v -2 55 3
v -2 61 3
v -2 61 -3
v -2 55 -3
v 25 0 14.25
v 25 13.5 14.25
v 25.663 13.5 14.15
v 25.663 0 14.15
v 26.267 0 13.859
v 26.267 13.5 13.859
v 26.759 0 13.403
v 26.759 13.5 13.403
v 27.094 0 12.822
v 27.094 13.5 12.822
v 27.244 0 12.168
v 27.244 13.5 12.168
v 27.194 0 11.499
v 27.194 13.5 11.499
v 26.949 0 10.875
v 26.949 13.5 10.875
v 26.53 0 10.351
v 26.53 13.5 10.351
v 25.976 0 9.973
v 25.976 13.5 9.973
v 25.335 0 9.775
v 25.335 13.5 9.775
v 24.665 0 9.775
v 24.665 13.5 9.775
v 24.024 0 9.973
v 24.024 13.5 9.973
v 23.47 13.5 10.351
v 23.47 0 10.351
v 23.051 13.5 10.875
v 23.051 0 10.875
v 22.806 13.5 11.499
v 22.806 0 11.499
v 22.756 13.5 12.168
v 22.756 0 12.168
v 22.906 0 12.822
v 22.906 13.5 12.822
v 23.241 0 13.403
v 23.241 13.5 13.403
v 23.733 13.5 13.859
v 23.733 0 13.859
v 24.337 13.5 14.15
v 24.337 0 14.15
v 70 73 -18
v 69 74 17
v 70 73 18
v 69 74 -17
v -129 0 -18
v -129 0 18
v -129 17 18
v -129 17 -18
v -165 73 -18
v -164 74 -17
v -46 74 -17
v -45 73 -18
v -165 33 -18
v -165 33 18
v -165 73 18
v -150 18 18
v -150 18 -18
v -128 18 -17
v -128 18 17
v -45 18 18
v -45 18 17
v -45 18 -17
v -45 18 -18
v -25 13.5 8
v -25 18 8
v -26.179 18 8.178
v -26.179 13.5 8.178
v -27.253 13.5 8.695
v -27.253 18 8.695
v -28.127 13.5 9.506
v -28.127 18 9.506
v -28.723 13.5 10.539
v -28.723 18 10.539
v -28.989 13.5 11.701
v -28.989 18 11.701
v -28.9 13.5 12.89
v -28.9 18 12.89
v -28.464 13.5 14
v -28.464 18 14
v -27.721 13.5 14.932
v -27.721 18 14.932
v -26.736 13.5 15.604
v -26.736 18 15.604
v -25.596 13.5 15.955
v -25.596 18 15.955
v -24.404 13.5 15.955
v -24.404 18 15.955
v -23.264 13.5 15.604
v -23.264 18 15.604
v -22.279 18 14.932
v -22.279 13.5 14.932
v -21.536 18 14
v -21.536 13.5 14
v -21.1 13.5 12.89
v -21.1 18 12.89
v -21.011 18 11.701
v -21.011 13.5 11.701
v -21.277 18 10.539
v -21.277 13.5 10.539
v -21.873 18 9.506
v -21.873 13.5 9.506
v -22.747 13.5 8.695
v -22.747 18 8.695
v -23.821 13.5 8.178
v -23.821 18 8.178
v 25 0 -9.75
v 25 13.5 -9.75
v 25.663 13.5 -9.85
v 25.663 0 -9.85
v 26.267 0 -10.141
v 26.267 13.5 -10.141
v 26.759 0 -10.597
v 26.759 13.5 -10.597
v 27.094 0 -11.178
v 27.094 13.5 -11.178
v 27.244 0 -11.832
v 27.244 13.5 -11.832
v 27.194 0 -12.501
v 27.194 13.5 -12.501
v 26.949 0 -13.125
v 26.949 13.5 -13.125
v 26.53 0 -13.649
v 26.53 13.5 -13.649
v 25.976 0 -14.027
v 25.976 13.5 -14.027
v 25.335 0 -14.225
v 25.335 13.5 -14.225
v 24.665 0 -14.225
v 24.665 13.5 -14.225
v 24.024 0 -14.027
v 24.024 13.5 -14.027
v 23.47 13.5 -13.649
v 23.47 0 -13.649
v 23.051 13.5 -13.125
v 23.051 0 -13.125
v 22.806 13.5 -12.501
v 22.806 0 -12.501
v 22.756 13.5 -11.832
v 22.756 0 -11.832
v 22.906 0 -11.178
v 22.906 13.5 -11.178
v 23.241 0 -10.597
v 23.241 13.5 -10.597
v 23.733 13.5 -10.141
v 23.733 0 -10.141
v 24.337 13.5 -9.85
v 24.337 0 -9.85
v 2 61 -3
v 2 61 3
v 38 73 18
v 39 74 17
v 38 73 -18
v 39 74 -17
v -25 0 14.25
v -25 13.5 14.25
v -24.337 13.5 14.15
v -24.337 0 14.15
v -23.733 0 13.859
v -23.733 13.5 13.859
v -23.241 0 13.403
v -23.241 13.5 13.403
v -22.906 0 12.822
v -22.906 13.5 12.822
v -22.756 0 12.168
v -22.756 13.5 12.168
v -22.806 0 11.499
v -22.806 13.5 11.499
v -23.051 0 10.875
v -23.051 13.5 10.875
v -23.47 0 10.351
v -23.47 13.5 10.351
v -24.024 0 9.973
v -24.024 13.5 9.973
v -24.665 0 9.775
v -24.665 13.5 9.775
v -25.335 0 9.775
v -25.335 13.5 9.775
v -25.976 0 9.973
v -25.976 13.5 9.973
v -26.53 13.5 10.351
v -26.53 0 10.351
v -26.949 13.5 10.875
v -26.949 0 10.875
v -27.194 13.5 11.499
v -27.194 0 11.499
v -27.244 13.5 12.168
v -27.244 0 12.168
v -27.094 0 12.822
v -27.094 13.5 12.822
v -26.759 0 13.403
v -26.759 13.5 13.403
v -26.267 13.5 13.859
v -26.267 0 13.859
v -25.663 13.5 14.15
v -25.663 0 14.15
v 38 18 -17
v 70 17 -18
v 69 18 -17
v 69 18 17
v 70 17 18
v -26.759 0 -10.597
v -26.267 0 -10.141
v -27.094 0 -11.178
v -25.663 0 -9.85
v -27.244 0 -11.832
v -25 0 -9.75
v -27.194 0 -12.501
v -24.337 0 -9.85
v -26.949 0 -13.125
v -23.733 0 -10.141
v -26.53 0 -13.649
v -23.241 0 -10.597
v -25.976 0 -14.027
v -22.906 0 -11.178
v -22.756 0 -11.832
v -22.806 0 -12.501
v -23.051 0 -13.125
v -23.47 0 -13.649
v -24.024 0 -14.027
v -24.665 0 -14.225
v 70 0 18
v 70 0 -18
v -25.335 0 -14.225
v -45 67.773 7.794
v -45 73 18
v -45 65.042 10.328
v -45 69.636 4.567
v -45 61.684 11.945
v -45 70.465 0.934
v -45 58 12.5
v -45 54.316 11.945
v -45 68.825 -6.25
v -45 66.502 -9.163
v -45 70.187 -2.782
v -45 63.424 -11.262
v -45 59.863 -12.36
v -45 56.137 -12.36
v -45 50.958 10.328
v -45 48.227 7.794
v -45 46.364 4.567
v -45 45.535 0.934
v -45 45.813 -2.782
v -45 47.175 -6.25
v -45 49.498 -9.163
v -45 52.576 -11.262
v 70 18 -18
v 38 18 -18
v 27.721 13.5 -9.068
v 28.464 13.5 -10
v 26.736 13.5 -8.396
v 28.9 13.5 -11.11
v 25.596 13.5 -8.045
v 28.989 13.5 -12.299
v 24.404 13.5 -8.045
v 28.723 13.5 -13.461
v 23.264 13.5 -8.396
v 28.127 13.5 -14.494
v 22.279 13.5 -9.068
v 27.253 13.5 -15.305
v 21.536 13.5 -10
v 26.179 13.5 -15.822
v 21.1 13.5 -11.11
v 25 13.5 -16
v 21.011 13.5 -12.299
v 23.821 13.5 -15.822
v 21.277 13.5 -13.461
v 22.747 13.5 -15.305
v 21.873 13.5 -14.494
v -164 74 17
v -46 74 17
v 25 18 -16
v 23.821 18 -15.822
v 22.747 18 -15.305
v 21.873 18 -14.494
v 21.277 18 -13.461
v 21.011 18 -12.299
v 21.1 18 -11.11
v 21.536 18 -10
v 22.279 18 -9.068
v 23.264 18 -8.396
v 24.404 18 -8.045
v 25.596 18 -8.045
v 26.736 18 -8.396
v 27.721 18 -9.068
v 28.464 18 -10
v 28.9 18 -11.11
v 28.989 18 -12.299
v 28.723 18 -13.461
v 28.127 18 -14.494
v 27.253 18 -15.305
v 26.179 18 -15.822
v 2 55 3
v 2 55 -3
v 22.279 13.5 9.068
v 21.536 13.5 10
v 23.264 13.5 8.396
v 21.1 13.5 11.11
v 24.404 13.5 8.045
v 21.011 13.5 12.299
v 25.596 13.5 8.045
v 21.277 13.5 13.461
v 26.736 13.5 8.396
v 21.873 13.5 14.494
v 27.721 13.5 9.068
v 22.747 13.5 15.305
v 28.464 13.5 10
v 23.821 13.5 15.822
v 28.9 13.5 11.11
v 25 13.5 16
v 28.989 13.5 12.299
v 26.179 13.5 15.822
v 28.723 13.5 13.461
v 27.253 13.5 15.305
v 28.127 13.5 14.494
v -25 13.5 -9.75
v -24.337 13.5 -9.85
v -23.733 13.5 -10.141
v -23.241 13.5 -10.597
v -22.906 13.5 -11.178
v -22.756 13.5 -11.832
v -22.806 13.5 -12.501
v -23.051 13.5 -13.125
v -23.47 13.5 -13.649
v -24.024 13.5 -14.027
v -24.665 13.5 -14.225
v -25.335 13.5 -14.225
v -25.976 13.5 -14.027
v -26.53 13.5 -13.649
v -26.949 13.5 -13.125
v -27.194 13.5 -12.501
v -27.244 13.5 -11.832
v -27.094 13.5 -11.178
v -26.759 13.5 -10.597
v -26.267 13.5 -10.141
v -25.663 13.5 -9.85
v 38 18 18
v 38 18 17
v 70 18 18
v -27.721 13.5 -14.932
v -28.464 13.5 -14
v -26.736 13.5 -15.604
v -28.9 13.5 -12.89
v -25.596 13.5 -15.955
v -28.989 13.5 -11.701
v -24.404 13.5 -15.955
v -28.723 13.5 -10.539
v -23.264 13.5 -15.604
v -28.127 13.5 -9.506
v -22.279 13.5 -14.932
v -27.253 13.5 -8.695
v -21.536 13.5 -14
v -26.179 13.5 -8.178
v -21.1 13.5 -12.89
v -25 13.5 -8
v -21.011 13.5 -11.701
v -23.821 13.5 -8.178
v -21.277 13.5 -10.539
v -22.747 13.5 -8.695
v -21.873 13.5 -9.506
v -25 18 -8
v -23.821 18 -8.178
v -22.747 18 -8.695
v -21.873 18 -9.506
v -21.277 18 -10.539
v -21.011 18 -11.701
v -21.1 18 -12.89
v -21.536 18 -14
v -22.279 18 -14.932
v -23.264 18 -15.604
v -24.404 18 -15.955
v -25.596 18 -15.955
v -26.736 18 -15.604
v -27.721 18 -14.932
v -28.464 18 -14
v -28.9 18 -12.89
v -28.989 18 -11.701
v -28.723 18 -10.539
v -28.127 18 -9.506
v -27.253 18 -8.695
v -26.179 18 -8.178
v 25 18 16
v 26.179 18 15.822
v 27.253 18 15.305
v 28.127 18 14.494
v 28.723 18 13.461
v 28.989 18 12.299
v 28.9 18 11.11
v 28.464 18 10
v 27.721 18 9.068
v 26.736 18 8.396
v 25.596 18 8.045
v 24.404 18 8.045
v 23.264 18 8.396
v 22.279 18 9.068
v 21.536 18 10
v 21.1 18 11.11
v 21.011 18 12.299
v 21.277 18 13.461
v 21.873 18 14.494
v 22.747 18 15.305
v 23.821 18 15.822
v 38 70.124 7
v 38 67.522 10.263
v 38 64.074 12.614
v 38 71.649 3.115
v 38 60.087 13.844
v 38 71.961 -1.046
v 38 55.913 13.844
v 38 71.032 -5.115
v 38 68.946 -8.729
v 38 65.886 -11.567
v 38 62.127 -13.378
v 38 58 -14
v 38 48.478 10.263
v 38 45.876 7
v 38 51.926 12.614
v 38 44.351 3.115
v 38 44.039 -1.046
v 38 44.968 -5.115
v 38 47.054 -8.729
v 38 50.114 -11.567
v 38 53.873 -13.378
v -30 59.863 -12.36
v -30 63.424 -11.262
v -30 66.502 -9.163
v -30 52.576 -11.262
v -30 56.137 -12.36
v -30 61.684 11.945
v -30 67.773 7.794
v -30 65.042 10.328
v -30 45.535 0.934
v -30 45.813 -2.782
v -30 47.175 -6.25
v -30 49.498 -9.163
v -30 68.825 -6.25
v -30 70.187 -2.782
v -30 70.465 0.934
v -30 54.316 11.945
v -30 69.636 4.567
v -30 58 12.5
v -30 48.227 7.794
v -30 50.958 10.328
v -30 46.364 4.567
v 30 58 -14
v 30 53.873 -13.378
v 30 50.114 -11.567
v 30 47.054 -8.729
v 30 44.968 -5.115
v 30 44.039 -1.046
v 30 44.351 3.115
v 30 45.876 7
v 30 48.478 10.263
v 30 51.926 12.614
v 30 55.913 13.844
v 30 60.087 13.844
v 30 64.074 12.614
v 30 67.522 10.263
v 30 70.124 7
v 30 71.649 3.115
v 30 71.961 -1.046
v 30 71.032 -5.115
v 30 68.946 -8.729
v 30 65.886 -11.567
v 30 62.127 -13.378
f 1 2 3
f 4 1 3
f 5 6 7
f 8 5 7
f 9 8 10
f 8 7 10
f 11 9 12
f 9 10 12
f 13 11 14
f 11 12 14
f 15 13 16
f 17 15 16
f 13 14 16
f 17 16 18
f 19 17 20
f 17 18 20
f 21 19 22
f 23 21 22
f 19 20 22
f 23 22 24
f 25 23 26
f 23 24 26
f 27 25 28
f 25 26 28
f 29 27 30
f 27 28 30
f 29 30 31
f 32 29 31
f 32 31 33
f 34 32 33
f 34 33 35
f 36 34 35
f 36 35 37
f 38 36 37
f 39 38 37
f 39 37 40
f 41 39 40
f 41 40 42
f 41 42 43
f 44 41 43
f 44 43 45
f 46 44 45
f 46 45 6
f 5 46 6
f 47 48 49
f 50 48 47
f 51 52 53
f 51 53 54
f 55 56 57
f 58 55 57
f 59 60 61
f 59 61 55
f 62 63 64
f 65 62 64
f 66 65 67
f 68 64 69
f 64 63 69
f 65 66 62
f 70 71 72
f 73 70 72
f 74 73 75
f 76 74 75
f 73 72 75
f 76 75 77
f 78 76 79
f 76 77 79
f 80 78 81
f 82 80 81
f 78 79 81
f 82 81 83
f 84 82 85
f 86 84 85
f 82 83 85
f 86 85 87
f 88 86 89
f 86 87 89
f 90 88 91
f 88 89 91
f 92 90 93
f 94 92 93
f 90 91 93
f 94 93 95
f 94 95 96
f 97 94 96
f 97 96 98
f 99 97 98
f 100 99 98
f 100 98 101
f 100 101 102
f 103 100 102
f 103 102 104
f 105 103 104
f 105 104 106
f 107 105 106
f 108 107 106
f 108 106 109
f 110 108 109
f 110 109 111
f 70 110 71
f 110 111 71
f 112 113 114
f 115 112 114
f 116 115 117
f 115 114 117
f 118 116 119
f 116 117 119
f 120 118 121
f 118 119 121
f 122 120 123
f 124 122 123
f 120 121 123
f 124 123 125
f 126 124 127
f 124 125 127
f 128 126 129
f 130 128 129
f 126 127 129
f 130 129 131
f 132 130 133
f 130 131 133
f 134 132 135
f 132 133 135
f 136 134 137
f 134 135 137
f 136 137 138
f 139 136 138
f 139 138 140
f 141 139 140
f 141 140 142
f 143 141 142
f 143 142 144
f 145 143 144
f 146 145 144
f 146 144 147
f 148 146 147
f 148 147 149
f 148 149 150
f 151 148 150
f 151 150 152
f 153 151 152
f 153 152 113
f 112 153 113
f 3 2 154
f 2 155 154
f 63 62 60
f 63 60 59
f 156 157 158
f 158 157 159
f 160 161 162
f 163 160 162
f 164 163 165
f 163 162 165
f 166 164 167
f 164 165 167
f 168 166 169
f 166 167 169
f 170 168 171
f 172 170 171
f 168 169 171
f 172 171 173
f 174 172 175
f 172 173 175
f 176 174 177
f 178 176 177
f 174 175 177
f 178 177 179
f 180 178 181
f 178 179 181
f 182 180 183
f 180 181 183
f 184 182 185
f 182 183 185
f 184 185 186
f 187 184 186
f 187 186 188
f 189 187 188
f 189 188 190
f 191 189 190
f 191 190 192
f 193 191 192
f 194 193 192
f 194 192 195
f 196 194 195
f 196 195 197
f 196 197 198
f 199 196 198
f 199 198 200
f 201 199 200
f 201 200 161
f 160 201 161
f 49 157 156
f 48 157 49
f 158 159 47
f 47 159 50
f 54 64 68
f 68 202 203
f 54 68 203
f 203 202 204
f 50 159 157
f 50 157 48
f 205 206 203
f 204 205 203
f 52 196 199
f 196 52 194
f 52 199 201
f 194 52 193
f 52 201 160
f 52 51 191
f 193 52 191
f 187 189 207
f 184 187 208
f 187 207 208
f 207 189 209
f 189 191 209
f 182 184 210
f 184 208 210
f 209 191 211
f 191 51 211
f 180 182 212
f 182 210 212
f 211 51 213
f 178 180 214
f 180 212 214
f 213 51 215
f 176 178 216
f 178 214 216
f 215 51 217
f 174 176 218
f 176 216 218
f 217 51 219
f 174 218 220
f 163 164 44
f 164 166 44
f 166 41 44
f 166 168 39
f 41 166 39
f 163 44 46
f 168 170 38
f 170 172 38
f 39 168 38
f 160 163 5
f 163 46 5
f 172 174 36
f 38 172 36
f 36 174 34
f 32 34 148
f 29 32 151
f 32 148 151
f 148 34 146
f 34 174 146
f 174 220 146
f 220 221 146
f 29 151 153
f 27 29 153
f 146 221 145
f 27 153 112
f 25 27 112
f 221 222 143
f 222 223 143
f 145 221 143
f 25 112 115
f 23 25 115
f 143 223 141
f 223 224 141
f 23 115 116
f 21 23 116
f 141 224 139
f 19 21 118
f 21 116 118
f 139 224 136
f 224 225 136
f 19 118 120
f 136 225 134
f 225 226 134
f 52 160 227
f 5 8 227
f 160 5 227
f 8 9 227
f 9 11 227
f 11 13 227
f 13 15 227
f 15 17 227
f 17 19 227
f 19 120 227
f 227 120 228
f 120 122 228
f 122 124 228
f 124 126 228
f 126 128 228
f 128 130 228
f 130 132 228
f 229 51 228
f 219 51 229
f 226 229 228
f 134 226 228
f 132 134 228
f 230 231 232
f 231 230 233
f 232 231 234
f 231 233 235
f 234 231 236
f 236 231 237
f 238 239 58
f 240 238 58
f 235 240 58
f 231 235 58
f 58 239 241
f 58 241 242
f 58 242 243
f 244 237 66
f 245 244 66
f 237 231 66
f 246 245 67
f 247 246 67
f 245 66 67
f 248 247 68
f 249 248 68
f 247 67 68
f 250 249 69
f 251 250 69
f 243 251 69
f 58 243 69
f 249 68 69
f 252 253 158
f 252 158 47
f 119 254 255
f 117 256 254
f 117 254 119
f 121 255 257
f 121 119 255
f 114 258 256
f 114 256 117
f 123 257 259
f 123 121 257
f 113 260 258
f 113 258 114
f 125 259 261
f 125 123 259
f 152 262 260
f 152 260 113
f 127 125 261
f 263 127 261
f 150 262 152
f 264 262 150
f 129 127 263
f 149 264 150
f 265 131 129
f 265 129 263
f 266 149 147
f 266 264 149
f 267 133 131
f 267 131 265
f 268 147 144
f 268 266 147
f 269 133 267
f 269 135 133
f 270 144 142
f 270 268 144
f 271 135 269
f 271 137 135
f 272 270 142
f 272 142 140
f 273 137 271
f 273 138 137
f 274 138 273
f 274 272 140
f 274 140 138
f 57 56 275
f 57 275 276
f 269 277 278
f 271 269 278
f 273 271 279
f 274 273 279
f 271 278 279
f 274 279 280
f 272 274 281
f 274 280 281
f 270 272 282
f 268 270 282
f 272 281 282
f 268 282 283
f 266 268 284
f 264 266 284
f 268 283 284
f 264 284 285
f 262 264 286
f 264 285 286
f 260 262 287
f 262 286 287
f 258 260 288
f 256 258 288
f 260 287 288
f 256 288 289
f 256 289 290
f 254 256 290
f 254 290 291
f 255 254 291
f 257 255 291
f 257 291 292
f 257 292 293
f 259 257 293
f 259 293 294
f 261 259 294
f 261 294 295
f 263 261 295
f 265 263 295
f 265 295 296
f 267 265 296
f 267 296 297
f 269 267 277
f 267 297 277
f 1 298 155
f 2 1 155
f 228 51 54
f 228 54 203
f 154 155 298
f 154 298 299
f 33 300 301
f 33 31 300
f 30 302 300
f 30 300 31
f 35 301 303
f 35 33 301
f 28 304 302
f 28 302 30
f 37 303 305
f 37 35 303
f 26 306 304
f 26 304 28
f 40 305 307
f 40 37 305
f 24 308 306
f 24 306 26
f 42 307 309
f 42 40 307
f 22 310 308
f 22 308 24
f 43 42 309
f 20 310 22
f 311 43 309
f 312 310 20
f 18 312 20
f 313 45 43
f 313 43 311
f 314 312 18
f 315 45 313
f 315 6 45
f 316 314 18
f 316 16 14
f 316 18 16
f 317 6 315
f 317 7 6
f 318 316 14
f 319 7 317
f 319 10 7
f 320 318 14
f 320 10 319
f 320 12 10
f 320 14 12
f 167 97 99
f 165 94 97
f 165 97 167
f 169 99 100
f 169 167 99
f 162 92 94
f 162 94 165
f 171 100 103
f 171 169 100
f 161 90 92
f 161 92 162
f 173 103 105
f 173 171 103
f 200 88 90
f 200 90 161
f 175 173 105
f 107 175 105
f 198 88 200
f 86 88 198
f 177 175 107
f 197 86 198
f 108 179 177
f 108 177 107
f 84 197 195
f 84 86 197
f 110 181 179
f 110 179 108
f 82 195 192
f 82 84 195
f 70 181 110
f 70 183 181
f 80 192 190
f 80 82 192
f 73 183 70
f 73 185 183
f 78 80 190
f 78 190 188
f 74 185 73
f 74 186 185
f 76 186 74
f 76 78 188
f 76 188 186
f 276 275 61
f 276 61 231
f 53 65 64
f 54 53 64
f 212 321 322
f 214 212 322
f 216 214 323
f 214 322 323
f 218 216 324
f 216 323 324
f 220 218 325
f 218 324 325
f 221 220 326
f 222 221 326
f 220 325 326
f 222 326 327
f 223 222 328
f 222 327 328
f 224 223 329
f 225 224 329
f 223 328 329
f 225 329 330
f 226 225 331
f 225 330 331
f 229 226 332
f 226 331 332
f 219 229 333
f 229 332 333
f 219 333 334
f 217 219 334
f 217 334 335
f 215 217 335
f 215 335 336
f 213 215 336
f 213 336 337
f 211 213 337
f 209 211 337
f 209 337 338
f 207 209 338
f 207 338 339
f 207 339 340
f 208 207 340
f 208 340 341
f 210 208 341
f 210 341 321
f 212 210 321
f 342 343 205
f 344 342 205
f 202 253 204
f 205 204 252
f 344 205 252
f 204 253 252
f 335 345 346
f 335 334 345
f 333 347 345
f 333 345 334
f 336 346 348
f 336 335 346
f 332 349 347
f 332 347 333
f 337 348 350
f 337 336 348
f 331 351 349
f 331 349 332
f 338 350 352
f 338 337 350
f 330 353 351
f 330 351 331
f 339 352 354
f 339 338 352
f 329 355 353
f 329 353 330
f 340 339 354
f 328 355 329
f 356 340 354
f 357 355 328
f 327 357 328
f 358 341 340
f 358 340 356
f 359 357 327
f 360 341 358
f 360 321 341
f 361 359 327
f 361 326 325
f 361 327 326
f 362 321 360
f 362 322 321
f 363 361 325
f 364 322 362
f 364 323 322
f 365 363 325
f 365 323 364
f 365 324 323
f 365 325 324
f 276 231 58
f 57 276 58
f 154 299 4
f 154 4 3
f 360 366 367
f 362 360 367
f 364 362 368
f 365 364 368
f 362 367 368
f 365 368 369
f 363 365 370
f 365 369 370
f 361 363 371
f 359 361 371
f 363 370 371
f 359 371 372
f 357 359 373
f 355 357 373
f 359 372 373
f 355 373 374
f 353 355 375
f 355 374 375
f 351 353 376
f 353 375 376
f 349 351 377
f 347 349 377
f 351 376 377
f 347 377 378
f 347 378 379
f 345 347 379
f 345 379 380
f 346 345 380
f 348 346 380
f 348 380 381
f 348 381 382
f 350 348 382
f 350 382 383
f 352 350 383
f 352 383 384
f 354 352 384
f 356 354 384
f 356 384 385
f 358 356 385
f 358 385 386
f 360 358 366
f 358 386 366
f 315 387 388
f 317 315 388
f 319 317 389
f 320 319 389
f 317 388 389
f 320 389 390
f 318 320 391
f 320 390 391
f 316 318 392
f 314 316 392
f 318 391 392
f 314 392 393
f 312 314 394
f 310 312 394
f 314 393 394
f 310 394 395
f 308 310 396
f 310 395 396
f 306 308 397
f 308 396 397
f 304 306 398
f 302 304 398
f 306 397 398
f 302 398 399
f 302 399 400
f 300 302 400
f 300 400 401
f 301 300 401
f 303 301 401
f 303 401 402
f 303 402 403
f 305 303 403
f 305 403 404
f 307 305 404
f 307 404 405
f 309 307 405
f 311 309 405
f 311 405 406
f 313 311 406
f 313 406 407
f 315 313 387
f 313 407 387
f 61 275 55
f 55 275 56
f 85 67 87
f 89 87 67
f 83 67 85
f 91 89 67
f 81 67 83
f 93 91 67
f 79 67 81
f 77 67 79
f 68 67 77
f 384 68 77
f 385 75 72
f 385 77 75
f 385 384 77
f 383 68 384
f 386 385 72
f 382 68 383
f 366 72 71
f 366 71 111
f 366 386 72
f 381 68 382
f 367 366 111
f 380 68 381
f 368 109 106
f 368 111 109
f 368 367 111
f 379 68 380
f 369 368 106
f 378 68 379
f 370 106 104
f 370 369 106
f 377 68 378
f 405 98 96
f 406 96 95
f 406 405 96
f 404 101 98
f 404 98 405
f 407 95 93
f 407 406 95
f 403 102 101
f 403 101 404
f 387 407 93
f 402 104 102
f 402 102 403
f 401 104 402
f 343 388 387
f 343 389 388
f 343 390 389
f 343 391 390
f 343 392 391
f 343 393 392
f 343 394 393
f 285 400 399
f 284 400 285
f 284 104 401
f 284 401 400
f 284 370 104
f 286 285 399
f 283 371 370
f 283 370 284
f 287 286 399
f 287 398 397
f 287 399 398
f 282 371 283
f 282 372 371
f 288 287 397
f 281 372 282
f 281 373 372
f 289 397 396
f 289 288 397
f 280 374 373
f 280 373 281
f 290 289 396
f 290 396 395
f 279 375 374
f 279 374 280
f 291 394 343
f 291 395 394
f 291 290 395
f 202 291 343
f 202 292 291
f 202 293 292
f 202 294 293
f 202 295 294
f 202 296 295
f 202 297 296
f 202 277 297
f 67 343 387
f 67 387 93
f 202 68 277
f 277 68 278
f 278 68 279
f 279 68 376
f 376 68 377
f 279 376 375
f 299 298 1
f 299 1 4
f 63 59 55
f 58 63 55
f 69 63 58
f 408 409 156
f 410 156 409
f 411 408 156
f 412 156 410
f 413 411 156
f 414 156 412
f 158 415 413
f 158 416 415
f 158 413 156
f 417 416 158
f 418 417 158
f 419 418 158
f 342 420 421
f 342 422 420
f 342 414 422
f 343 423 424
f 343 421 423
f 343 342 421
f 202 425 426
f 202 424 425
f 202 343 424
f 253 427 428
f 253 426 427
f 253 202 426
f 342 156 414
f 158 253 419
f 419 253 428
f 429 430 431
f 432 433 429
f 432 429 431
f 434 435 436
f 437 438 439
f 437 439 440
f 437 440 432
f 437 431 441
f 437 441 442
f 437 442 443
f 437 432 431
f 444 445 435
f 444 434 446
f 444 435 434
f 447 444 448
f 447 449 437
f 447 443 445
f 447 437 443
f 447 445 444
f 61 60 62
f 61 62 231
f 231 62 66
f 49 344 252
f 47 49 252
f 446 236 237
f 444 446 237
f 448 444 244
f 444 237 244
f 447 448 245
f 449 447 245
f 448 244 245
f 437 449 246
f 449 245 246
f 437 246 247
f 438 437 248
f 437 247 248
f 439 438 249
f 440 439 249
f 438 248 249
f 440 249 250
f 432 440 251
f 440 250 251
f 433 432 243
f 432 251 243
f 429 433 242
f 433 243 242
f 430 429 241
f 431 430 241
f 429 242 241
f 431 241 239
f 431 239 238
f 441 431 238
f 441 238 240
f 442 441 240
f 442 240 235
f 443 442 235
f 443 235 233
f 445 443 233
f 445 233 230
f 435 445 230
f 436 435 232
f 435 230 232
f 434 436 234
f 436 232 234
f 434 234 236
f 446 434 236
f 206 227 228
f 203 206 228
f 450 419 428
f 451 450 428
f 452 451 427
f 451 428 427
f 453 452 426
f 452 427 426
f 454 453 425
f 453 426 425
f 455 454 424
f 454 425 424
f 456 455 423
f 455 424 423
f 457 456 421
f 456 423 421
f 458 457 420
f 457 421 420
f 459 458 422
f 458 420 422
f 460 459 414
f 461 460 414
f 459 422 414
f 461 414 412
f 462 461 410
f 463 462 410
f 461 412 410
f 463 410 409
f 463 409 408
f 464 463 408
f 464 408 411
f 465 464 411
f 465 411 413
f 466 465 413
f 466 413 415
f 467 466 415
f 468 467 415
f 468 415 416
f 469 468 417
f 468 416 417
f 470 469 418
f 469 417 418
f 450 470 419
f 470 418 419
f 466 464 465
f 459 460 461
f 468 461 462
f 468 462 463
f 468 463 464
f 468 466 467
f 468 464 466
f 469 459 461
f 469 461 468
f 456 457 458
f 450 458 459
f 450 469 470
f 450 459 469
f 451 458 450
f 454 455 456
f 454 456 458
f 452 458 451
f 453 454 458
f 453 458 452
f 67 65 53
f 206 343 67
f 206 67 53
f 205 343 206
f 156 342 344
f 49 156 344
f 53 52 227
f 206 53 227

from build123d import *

# Parameters (mm, degrees)
SKETCH1_W           = 199
SKETCH1_H           = 36
BOSS_EXTRUDE1_DEPTH = 18
SKETCH2_R           = 4
CUT_EXTRUDE1_DEPTH  = 4.5
CUT_EXTRUDE2_REACH  = 132.948
SKETCH3_R           = 2.25
CHAMFER1_SIZE       = 1
SKETCH4_W           = 120
SKETCH4_H           = 36
SKETCH4_W_2         = 32
BOSS_EXTRUDE2_DEPTH = 56
CHAMFER2_SIZE       = 1
CHAMFER3_SIZE       = 15
SKETCH5_R           = 12.5
BOSS_EXTRUDE3_DEPTH = 15
SKETCH6_R           = 14
BOSS_EXTRUDE4_DEPTH = 8
SKETCH7_W           = 6
SKETCH7_H           = 6
BOSS_EXTRUDE5_DEPTH = 2


with BuildPart() as part:
    # Sketch1 → Boss-Extrude1 (new body)
    with BuildSketch(Plane(origin=(0, 0, 0), x_dir=(1, 0, 0), z_dir=(0, 1, 0))):
        with Locations((-29.5, 0)):
            Rectangle(SKETCH1_W, SKETCH1_H)
    extrude(amount=BOSS_EXTRUDE1_DEPTH)

    # Sketch2 → Cut-Extrude1 (cut)
    with BuildSketch(Plane(origin=(0, 18, 0), x_dir=(1, 0, 0), z_dir=(0, 1, 0))):
        with Locations(Location((-25, 12, 0), (0, 0, 270))):
            Circle(SKETCH2_R)
        with Locations(Location((25, 12, 0), (0, 0, 90))):
            Circle(SKETCH2_R)
        with Locations(Location((25, -12, 0), (0, 0, 270))):
            Circle(SKETCH2_R)
        with Locations(Location((-25, -12, 0), (0, 0, 90))):
            Circle(SKETCH2_R)
    extrude(amount=-CUT_EXTRUDE1_DEPTH, mode=Mode.SUBTRACT)

    # Sketch3 → Cut-Extrude2 (cut, up to next)
    with BuildSketch(Plane(origin=(0, 13.5, 0), x_dir=(1, 0, 0), z_dir=(0, 1, 0)), mode=Mode.PRIVATE) as cut_extrude2_sk1:
        with Locations(Location((-25, 12, 0), (0, 0, 270))):
            Circle(SKETCH3_R)
    cut_extrude2_tool1 = extrude(cut_extrude2_sk1.sketch, amount=-CUT_EXTRUDE2_REACH, mode=Mode.PRIVATE) & part.part
    # Sketch3 → Cut-Extrude2 (cut, up to next)
    with BuildSketch(Plane(origin=(0, 13.5, 0), x_dir=(1, 0, 0), z_dir=(0, 1, 0)), mode=Mode.PRIVATE) as cut_extrude2_sk2:
        with Locations(Location((-25, -12, 0), (0, 0, 270))):
            Circle(SKETCH3_R)
    cut_extrude2_tool2 = extrude(cut_extrude2_sk2.sketch, amount=-CUT_EXTRUDE2_REACH, mode=Mode.PRIVATE) & part.part
    # Sketch3 → Cut-Extrude2 (cut, up to next)
    with BuildSketch(Plane(origin=(0, 13.5, 0), x_dir=(1, 0, 0), z_dir=(0, 1, 0)), mode=Mode.PRIVATE) as cut_extrude2_sk3:
        with Locations(Location((25, 12, 0), (0, 0, 270))):
            Circle(SKETCH3_R)
    cut_extrude2_tool3 = extrude(cut_extrude2_sk3.sketch, amount=-CUT_EXTRUDE2_REACH, mode=Mode.PRIVATE) & part.part
    # Sketch3 → Cut-Extrude2 (cut, up to next)
    with BuildSketch(Plane(origin=(0, 13.5, 0), x_dir=(1, 0, 0), z_dir=(0, 1, 0)), mode=Mode.PRIVATE) as cut_extrude2_sk4:
        with Locations(Location((25, -12, 0), (0, 0, 270))):
            Circle(SKETCH3_R)
    cut_extrude2_tool4 = extrude(cut_extrude2_sk4.sketch, amount=-CUT_EXTRUDE2_REACH, mode=Mode.PRIVATE) & part.part
    add(cut_extrude2_tool1.solids().sort_by_distance((-25, 13.5, -12))[0], mode=Mode.SUBTRACT)
    add(cut_extrude2_tool2.solids().sort_by_distance((-25, 13.5, 12))[0], mode=Mode.SUBTRACT)
    add(cut_extrude2_tool3.solids().sort_by_distance((25, 13.5, -12))[0], mode=Mode.SUBTRACT)
    add(cut_extrude2_tool4.solids().sort_by_distance((25, 13.5, 12))[0], mode=Mode.SUBTRACT)

    # Chamfer1
    chamfer1_edges = [part.edges().sort_by_distance(p)[0] for p in [
        (70, 18, 0),
        (-29.5, 18, -18),
        (-129, 18, 0),
        (-29.5, 18, 18),
    ]]
    chamfer(chamfer1_edges, length=CHAMFER1_SIZE)

    # Sketch4 → Boss-Extrude2 (add)
    with BuildSketch(Plane(origin=(0, 18, 0), x_dir=(1, 0, 0), z_dir=(0, 1, 0))):
        with Locations((-105, 0)):
            Rectangle(SKETCH4_W, SKETCH4_H)
        with Locations((54, 0)):
            Rectangle(SKETCH4_W_2, SKETCH4_H)
    extrude(amount=BOSS_EXTRUDE2_DEPTH)

    # Chamfer2
    chamfer2_edges = [part.edges().sort_by_distance(p)[0] for p in [
        (-45, 74, 0),
        (-105, 74, -18),
        (-165, 74, 0),
        (-105, 74, 18),
        (38, 74, 0),
        (54, 74, 18),
        (70, 74, 0),
        (54, 74, -18),
    ]]
    chamfer(chamfer2_edges, length=CHAMFER2_SIZE)

    # Chamfer3
    chamfer3_edges = [part.edges().sort_by_distance(p)[0] for p in [
        (-165, 18, 0),
    ]]
    chamfer(chamfer3_edges, length=CHAMFER3_SIZE)

    # Sketch5 → Boss-Extrude3 (add)
    with BuildSketch(Plane(origin=(-45, 0, 0), x_dir=(0, 0, -1), z_dir=(1, 0, 0))):
        with Locations(Location((0, 58, 0), (0, 0, 180))):
            Circle(SKETCH5_R)
    extrude(amount=BOSS_EXTRUDE3_DEPTH)

    # Sketch6 → Boss-Extrude4 (add)
    with BuildSketch(Plane.ZY.offset(-38)):
        with Locations(Location((0, 58, 0), (0, 0, 180))):
            Circle(SKETCH6_R)
    extrude(amount=BOSS_EXTRUDE4_DEPTH)


with BuildPart() as body_2:
    # Sketch7 → Boss-Extrude5 (new, symmetric)
    with BuildSketch(Plane(origin=(0, 0, 0), x_dir=(0, 0, -1), z_dir=(1, 0, 0))):
        with Locations((0, 58)):
            Rectangle(SKETCH7_W, SKETCH7_H)
    extrude(amount=BOSS_EXTRUDE5_DEPTH, both=True)


solid = Compound([part.part, body_2.part])
